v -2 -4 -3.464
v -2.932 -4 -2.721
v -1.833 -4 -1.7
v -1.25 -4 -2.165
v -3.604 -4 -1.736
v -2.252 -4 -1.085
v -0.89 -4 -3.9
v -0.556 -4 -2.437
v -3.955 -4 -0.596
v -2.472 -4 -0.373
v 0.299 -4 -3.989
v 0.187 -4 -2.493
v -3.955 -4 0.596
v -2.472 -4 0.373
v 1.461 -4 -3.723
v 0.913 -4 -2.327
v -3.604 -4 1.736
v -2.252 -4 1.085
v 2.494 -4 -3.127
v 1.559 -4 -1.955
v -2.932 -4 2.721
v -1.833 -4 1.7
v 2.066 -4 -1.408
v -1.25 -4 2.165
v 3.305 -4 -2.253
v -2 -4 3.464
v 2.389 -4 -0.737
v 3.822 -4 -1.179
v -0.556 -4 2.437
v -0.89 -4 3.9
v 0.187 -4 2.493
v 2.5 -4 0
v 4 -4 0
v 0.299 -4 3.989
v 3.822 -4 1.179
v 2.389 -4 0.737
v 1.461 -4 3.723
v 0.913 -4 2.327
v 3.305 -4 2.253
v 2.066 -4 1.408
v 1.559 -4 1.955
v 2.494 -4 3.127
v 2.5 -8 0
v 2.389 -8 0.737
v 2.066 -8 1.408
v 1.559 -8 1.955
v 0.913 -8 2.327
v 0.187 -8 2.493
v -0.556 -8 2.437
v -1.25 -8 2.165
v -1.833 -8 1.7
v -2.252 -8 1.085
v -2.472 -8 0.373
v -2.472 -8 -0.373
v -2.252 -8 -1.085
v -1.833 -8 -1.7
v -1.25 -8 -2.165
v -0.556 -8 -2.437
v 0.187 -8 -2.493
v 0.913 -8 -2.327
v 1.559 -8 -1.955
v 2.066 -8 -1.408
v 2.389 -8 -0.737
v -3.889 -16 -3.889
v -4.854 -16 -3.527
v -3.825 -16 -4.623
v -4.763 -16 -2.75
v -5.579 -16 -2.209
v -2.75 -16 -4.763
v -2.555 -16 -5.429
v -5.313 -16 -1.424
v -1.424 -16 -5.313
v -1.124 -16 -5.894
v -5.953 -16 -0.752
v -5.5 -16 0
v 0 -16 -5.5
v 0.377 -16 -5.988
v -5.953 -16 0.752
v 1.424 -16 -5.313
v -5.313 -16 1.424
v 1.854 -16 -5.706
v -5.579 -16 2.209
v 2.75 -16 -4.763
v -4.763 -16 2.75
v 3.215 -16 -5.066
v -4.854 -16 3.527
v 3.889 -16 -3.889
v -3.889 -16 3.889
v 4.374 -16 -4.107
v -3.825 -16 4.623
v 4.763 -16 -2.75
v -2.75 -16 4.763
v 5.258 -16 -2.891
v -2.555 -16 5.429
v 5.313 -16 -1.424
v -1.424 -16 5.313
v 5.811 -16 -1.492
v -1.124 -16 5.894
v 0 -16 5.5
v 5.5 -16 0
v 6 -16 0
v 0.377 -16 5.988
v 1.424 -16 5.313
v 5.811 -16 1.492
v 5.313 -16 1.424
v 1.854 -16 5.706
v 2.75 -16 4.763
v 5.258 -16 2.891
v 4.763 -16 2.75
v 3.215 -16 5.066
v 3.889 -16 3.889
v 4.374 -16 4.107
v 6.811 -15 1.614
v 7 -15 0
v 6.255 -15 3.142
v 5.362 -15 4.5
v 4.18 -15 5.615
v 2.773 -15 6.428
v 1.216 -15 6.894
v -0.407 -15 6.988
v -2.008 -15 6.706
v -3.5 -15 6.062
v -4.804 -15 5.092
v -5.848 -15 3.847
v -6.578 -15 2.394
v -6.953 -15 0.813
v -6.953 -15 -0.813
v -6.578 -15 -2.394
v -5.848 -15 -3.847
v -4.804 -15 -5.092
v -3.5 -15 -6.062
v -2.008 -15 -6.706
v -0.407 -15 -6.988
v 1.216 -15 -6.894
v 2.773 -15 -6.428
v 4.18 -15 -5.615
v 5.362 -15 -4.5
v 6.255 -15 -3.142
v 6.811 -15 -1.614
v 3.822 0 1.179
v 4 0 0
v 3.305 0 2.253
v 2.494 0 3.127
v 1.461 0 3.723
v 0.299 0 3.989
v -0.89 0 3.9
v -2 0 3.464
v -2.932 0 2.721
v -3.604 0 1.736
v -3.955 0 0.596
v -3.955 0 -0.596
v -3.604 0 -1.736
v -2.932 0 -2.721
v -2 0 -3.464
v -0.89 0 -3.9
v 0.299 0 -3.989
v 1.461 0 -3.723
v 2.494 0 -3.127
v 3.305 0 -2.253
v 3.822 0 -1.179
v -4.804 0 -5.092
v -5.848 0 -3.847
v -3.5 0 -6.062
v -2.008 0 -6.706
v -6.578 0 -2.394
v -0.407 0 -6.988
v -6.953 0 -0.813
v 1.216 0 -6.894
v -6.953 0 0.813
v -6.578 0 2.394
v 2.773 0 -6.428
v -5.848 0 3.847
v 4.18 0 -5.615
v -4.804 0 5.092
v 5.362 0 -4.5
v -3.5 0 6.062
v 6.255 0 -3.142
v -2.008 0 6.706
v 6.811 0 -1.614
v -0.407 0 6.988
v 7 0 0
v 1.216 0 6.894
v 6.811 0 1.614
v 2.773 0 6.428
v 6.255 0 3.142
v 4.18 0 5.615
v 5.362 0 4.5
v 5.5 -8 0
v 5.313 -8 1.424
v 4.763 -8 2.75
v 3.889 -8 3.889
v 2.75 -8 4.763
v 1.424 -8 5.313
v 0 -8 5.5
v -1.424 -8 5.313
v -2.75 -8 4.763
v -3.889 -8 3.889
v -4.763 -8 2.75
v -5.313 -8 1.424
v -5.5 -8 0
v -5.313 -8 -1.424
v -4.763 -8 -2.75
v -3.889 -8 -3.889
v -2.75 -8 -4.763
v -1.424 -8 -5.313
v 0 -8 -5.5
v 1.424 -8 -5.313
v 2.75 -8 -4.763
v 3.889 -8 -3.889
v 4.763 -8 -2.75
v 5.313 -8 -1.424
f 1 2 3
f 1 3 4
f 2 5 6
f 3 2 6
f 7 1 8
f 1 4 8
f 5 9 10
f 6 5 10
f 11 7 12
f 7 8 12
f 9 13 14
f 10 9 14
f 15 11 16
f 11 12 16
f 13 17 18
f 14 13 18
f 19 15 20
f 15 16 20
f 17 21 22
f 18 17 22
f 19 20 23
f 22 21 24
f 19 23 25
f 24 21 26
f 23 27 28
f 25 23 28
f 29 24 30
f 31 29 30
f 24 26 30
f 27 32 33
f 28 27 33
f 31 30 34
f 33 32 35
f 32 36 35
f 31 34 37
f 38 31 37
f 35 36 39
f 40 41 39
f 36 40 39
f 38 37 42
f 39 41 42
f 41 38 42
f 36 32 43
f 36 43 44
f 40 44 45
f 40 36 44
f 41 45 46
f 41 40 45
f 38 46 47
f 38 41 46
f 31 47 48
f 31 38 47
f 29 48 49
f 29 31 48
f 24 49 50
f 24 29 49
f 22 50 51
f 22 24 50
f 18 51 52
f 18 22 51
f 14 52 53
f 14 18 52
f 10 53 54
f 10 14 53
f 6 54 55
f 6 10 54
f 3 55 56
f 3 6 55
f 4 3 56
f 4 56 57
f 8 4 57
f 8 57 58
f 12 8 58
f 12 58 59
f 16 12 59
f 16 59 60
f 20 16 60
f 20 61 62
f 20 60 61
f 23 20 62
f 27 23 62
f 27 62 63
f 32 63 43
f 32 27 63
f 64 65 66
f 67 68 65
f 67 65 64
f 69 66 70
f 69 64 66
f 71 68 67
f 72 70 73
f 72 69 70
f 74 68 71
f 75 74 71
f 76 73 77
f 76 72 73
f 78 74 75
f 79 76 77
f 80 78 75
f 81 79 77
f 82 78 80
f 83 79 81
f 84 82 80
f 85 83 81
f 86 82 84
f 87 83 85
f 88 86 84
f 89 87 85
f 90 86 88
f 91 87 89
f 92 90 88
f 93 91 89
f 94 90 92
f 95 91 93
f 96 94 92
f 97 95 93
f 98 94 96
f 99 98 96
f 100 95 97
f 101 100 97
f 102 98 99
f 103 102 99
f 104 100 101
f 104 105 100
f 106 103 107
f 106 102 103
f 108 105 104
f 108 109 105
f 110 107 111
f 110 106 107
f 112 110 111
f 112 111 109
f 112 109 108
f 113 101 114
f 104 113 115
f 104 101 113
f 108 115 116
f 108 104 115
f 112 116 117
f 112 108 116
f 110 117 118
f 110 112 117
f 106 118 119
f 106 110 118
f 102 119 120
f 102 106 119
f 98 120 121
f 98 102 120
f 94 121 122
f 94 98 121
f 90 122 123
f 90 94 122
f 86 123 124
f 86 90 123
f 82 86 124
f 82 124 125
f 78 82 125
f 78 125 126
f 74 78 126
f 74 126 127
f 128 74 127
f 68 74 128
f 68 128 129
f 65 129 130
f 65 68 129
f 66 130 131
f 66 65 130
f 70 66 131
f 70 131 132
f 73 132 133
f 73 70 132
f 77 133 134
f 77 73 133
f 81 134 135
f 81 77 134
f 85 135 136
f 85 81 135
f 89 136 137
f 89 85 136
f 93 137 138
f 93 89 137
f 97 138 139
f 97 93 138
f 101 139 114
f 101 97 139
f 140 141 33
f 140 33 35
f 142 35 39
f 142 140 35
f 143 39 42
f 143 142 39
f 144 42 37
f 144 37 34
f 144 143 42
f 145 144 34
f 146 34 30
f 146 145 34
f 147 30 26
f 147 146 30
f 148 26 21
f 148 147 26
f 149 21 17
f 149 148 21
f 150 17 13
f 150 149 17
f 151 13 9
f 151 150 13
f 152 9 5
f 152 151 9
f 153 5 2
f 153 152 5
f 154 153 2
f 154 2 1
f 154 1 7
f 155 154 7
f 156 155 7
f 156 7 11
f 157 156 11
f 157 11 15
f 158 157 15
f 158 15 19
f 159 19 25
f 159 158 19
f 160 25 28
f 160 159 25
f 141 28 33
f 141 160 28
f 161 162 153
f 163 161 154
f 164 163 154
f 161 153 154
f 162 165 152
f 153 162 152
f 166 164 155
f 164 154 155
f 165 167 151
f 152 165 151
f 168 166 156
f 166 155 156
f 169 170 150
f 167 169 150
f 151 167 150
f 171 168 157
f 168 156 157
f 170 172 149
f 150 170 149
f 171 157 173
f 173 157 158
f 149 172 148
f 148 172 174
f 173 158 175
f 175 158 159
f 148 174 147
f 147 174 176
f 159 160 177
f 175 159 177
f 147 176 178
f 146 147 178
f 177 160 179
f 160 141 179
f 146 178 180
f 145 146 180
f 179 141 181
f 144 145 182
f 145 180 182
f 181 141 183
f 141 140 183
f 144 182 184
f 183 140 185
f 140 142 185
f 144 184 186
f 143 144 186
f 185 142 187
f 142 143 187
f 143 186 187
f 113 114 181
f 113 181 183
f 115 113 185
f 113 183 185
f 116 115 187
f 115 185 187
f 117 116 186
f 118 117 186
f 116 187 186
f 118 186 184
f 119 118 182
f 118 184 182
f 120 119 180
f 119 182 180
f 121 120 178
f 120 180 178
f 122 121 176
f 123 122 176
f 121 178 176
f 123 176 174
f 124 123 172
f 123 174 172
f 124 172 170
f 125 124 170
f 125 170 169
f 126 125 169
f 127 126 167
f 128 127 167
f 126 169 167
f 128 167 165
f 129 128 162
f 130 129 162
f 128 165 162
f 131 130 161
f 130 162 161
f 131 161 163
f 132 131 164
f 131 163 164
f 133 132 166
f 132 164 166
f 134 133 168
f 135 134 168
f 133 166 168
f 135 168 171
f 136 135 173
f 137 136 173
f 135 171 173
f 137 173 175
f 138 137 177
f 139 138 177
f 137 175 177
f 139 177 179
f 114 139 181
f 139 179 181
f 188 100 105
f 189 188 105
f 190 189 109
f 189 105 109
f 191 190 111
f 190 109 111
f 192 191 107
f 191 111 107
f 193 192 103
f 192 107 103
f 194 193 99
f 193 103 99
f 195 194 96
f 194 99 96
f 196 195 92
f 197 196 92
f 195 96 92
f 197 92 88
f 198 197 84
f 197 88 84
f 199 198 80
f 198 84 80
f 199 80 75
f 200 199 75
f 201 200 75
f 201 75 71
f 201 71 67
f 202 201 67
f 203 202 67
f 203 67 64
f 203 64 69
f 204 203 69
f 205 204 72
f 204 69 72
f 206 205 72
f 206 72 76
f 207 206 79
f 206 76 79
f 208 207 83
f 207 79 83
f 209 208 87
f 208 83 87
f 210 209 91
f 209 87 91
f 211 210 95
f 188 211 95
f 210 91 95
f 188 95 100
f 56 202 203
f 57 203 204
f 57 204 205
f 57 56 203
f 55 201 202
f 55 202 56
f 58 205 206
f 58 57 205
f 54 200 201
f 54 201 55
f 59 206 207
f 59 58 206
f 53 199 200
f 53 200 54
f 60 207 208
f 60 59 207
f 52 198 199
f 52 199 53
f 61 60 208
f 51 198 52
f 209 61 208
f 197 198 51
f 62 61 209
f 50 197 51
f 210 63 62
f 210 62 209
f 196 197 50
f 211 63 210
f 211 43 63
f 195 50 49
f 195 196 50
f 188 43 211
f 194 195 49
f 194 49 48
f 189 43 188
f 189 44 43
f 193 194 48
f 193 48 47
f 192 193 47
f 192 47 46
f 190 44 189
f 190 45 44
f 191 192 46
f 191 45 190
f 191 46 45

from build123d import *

# Parameters (mm, degrees)
F0_R     = 7
F0_R_2   = 2.5
F1_DEPTH = 16
F2_R     = 4
F3_DEPTH = 4
F4_SIZE  = 1
F5_R     = 5.5
F6_DEPTH = 8


with BuildPart() as f1:
    # F0 (on Front) → F1 (new body)
    with BuildSketch(Plane.XZ):
        Circle(F0_R)
        Circle(F0_R_2, mode=Mode.SUBTRACT)
    extrude(amount=F1_DEPTH)

    # F2 (on Front) → F3 (cut)
    with BuildSketch(Plane.XZ):
        Circle(F2_R)
    extrude(amount=F3_DEPTH, mode=Mode.SUBTRACT)

    # F4
    f4_edges = [f1.edges().sort_by_distance(p)[0] for p in [
        (-7, -16, 0),
    ]]
    chamfer(f4_edges, length=F4_SIZE)

    # F2 (on Front) + F5 (on face) → F6 (cut)
    with BuildSketch(Plane.XZ):
        Circle(F2_R)
    with BuildSketch(Plane.XZ.offset(16)):
        Circle(F5_R)
    extrude(amount=-F6_DEPTH, mode=Mode.SUBTRACT)


solid = f1.part
